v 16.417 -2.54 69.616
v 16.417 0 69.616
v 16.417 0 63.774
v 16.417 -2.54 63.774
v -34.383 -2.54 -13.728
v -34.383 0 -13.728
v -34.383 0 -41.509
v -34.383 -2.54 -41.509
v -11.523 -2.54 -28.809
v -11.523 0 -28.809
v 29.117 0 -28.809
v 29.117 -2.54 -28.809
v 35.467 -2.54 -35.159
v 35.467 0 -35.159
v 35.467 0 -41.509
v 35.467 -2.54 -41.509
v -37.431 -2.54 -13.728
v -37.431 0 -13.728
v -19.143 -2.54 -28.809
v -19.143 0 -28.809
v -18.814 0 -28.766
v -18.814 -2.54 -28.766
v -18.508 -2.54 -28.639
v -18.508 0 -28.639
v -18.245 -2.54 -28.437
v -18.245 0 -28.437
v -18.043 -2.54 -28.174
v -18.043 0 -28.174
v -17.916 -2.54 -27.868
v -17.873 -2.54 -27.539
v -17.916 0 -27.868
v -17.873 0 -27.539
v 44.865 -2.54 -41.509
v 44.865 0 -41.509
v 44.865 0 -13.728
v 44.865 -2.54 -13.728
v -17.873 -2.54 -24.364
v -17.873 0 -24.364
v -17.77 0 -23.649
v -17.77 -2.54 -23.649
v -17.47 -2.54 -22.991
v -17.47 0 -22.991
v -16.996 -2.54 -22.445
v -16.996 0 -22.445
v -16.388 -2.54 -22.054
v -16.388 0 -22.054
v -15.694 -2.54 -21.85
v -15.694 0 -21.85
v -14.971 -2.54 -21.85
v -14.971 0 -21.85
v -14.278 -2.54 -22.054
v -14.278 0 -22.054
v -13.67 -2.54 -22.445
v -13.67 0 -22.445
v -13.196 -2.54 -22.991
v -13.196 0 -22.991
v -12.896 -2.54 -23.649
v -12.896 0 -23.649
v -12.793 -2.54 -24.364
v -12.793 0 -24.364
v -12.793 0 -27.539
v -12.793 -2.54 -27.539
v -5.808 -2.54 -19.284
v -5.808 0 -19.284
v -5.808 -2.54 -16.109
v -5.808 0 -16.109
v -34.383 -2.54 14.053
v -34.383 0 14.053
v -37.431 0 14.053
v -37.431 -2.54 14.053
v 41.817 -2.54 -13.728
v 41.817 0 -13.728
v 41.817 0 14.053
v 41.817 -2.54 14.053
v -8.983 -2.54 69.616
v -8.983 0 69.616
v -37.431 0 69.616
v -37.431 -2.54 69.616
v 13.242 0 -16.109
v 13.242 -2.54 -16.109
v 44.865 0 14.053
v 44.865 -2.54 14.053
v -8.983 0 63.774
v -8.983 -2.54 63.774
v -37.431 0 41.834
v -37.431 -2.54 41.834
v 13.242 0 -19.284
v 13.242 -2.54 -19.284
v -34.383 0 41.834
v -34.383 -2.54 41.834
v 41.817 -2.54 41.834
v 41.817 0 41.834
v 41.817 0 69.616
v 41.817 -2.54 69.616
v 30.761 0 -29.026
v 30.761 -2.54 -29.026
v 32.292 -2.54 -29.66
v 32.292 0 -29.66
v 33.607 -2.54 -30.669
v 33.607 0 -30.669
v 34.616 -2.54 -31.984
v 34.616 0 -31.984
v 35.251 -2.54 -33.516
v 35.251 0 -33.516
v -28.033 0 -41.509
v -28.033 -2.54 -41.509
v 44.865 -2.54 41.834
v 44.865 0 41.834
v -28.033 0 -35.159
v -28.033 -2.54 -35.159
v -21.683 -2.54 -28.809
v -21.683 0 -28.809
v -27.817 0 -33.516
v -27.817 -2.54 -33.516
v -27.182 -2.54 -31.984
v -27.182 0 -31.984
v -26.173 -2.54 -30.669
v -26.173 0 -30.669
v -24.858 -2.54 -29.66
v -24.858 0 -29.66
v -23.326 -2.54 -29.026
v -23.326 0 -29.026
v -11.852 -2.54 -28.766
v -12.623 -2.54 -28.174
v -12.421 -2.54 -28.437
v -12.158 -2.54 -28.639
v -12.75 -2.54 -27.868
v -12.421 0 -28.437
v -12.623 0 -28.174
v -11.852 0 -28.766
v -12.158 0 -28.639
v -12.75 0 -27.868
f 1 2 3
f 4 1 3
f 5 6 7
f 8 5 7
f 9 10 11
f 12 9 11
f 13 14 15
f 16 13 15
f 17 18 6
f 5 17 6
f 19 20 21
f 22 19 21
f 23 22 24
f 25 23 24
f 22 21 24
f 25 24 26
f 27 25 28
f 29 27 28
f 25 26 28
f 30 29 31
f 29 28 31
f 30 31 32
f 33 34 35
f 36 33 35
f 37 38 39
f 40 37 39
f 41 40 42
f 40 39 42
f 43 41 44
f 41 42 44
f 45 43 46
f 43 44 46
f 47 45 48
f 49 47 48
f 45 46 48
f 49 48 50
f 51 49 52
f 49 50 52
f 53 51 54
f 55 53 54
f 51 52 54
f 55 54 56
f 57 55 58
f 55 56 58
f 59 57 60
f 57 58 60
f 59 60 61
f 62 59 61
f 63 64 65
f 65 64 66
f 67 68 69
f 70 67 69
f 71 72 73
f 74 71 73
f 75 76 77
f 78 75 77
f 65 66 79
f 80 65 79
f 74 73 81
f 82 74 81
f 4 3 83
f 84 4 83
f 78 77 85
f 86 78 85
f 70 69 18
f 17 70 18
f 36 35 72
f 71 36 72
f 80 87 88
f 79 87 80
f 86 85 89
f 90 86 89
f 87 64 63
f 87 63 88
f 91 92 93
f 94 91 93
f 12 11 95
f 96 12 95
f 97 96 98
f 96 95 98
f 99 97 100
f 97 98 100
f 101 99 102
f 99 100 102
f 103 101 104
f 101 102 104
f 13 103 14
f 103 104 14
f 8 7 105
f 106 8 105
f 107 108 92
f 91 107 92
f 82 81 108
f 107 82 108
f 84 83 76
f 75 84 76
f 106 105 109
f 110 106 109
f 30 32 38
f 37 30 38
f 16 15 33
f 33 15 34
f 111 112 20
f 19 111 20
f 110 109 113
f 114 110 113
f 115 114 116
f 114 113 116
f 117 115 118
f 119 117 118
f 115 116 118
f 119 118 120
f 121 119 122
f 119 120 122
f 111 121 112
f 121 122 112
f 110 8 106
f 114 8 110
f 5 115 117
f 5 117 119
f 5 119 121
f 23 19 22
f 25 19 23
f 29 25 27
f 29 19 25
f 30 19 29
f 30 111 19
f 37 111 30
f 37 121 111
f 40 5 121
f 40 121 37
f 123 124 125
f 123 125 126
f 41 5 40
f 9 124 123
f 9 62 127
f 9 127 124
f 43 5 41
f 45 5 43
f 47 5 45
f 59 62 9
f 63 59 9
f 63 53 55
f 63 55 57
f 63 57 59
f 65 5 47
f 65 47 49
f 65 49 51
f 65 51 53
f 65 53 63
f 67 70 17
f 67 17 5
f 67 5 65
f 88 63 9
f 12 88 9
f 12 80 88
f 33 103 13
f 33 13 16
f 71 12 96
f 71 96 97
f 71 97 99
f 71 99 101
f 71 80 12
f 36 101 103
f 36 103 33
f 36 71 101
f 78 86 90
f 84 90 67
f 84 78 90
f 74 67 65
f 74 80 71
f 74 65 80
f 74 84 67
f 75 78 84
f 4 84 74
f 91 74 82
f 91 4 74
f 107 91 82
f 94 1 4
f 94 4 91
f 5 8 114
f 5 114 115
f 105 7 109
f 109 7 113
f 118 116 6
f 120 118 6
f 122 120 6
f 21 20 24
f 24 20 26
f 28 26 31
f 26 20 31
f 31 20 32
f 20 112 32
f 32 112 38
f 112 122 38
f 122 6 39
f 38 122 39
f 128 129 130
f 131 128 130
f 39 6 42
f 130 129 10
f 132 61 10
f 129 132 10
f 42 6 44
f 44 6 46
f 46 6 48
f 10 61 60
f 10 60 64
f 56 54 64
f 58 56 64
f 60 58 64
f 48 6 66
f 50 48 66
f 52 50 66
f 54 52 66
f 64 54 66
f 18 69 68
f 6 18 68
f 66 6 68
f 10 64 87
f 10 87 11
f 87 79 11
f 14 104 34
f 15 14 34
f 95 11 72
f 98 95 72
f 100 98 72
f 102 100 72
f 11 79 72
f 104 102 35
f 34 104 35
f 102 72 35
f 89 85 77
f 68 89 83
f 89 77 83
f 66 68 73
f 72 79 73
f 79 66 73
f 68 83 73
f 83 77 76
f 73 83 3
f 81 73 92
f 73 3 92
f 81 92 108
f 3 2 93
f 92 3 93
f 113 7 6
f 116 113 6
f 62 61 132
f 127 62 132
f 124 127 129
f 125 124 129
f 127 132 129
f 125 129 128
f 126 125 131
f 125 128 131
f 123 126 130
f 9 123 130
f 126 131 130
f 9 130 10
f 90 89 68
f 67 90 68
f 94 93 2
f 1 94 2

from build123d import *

# Parameters (mm, degrees)
F0_W     = 19.05
F0_H     = 3.175
F1_DEPTH = 2.54


with BuildPart() as f1:
    # F0 (on Front) → F1 (new body)
    with BuildSketch(Plane.XZ):
        with BuildLine():
            Line((16.417073, 63.773632), (3.717073, 63.773632))
            Line((3.717073, 63.773632), (-8.982927, 63.773632))
            Line((-8.982927, 63.773632), (-8.982927, 69.615632))
            Line((-8.982927, 69.615632), (-37.430927, 69.615632))
            Line((-37.430927, 69.615632), (-37.430927, 41.834382))
            Line((-37.430927, 41.834382), (-34.382927, 41.834382))
            Line((-34.382927, 41.834382), (-34.382927, 14.053132))
            Line((-34.382927, 14.053132), (-37.430927, 14.053132))
            Line((-37.430927, 14.053132), (-37.430927, -13.728118))
            Line((-37.430927, -13.728118), (-34.382927, -13.728118))
            Line((-34.382927, -13.728118), (-34.382927, -41.509368))
            Line((-34.382927, -41.509368), (-28.032927, -41.509368))
            Line((-28.032927, -41.509368), (-28.032927, -35.159368))
            ThreePointArc((-28.032927, -35.159368), (-26.173055, -30.66924), (-21.682927, -28.809368))
            Line((-21.682927, -28.809368), (-19.142927, -28.809368))
            ThreePointArc((-19.142927, -28.809368), (-18.244901, -28.437393), (-17.872927, -27.539368))
            Line((-17.872927, -27.539368), (-17.872927, -24.364368))
            ThreePointArc((-17.872927, -24.364368), (-15.332927, -21.824368), (-12.792927, -24.364368))
            Line((-12.792927, -24.364368), (-12.792927, -27.539368))
            ThreePointArc((-12.792927, -27.539368), (-12.420952, -28.437393), (-11.522927, -28.809368))
            Line((-11.522927, -28.809368), (29.117073, -28.809368))
            ThreePointArc((29.117073, -28.809368), (33.607201, -30.66924), (35.467073, -35.159368))
            Line((35.467073, -35.159368), (35.467073, -41.509368))
            Line((35.467073, -41.509368), (44.865073, -41.509368))
            Line((44.865073, -41.509368), (44.865073, -13.728118))
            Line((44.865073, -13.728118), (41.817073, -13.728118))
            Line((41.817073, -13.728118), (41.817073, 14.053132))
            Line((41.817073, 14.053132), (44.865073, 14.053132))
            Line((44.865073, 14.053132), (44.865073, 41.834382))
            Line((44.865073, 41.834382), (41.817073, 41.834382))
            Line((41.817073, 41.834382), (41.817073, 69.615632))
            Line((41.817073, 69.615632), (16.417073, 69.615632))
            Line((16.417073, 69.615632), (16.417073, 63.773632))
        make_face()
        with Locations((3.717073, -17.696868)):
            Rectangle(F0_W, F0_H, mode=Mode.SUBTRACT)
    extrude(amount=F1_DEPTH)


solid = f1.part
